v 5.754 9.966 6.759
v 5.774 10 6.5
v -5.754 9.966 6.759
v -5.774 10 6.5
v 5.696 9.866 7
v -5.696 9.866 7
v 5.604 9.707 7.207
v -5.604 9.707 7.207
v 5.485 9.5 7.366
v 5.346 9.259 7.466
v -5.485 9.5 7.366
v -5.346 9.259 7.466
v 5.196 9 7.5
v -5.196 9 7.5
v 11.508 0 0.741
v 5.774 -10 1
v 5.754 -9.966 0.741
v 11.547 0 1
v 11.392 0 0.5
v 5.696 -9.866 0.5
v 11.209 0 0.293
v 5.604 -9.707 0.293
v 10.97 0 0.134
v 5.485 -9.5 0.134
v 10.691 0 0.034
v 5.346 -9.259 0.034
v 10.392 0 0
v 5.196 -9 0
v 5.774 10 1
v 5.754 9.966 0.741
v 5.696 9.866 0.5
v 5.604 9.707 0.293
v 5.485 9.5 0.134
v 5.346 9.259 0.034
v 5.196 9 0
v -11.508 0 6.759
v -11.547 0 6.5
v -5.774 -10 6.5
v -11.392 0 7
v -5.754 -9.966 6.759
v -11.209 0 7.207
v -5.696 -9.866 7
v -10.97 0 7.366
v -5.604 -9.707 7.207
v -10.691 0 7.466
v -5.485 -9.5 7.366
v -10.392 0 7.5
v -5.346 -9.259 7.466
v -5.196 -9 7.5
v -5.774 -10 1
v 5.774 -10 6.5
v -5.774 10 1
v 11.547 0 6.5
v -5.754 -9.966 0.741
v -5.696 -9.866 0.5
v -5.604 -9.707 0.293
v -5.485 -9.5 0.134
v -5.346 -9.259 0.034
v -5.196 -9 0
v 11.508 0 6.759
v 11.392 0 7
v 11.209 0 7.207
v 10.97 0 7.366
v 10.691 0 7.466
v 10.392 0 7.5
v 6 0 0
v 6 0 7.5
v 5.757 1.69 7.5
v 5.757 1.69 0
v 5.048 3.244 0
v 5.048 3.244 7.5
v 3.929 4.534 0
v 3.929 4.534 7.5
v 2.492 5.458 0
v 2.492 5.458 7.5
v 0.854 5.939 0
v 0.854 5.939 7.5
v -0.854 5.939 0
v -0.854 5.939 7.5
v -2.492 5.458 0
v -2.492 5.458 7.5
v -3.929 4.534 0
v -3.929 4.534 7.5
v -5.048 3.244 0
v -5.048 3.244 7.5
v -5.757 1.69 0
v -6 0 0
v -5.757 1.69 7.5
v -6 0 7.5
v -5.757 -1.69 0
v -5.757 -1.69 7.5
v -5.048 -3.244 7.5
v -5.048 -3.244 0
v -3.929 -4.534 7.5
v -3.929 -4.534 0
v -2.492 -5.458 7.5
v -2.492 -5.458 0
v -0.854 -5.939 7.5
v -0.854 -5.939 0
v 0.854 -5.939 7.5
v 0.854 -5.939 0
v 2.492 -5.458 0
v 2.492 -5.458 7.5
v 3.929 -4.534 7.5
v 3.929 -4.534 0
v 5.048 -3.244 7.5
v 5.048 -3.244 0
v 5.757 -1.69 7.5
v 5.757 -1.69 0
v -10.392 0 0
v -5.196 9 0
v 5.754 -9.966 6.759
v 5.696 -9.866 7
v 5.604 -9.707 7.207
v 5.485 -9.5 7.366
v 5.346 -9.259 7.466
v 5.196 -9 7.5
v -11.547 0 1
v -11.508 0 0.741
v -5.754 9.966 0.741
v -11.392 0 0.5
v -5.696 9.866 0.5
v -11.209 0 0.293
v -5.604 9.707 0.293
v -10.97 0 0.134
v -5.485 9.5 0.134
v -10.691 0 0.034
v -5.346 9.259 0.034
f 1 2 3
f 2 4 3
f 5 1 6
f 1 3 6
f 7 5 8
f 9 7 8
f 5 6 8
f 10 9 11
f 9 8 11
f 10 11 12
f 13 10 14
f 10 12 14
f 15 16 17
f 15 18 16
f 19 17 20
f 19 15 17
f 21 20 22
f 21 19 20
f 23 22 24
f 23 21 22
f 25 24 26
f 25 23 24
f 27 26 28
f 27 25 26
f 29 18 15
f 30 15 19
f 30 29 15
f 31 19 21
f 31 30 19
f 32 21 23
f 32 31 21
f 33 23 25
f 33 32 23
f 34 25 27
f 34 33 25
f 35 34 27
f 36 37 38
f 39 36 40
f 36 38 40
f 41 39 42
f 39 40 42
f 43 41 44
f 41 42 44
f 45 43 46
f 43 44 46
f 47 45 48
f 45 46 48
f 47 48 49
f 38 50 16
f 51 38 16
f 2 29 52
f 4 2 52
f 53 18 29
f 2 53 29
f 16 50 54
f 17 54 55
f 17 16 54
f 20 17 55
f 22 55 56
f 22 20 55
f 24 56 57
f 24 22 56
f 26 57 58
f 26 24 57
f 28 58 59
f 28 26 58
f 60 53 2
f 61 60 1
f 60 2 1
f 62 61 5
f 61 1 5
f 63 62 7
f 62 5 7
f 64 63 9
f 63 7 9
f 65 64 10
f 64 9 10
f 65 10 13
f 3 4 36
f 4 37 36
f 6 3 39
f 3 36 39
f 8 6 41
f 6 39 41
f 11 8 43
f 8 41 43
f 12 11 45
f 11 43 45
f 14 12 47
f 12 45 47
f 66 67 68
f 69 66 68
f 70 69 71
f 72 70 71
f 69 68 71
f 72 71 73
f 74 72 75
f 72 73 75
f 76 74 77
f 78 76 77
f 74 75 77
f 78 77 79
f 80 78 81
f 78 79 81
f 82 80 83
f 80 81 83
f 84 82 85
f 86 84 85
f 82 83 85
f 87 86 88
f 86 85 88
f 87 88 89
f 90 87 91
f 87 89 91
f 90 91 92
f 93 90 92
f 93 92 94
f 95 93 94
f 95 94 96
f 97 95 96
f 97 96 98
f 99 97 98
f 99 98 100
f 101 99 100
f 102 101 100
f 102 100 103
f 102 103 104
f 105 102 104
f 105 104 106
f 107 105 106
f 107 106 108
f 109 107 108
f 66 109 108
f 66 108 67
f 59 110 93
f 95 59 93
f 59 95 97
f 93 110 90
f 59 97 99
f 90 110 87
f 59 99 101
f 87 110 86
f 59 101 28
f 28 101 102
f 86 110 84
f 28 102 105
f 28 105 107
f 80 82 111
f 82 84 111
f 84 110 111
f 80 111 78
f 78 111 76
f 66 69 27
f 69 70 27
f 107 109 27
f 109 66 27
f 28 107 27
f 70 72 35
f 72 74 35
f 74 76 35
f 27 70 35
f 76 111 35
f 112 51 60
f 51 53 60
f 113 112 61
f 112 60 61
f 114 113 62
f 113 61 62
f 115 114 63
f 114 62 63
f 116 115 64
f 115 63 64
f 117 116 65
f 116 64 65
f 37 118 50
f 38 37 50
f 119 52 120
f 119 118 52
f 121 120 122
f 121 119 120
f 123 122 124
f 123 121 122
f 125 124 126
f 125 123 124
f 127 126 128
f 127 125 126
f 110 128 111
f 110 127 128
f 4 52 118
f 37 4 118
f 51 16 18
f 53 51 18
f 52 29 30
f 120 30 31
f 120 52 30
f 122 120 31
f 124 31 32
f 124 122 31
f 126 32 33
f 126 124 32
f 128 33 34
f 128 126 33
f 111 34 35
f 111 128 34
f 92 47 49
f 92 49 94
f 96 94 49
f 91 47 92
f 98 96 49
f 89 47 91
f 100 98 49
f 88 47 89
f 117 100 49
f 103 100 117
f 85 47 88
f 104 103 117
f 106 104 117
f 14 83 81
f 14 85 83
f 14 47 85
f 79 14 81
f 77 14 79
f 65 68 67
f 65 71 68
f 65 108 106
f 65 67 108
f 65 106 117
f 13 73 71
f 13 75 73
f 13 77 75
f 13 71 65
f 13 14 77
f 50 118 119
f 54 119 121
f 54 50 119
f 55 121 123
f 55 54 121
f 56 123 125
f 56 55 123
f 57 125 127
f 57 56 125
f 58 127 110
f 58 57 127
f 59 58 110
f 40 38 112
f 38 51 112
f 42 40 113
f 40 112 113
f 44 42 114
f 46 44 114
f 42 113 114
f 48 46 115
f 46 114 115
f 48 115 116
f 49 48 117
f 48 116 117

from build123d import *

# Parameters (mm, degrees)
EXTRUDE_3_DEPTH     = 7.5
FILLET_3_R          = 1
SKETCH_4_R          = 6
CUT_EXTRUDE_1_DEPTH = 18.017148214


with BuildPart() as part:
    # 草图1 → 凸台-拉伸3 (new body)
    with BuildSketch(Plane.XY):
        Polygon((5.773502692, -10), (11.547005384, 0), (5.773502692, 10), (-5.773502692, 10), (-11.547005384, 0), (-5.773502692, -10), align=None)
    extrude(amount=EXTRUDE_3_DEPTH)

    # 圆角3
    fillet_3_edges = [part.edges().sort_by_distance(p)[0] for p in [
        (8.660254038, 5, 7.5),
        (0, 10, 7.5),
        (-8.660254038, 5, 7.5),
        (-8.660254038, -5, 7.5),
        (0, -10, 7.5),
        (-8.660254038, -5, 0),
        (-8.660254038, 5, 0),
        (0, 10, 0),
        (8.660254038, -5, 7.5),
        (8.660254038, 5, 0),
        (8.660254038, -5, 0),
        (0, -10, 0),
    ]]
    fillet(fillet_3_edges, radius=FILLET_3_R)

    # 草图4 → 切除-拉伸1 (cut, through all)
    with BuildSketch(Plane.XY.offset(7.5)):
        Circle(SKETCH_4_R)
    extrude(amount=-CUT_EXTRUDE_1_DEPTH, mode=Mode.SUBTRACT)


solid = part.part
